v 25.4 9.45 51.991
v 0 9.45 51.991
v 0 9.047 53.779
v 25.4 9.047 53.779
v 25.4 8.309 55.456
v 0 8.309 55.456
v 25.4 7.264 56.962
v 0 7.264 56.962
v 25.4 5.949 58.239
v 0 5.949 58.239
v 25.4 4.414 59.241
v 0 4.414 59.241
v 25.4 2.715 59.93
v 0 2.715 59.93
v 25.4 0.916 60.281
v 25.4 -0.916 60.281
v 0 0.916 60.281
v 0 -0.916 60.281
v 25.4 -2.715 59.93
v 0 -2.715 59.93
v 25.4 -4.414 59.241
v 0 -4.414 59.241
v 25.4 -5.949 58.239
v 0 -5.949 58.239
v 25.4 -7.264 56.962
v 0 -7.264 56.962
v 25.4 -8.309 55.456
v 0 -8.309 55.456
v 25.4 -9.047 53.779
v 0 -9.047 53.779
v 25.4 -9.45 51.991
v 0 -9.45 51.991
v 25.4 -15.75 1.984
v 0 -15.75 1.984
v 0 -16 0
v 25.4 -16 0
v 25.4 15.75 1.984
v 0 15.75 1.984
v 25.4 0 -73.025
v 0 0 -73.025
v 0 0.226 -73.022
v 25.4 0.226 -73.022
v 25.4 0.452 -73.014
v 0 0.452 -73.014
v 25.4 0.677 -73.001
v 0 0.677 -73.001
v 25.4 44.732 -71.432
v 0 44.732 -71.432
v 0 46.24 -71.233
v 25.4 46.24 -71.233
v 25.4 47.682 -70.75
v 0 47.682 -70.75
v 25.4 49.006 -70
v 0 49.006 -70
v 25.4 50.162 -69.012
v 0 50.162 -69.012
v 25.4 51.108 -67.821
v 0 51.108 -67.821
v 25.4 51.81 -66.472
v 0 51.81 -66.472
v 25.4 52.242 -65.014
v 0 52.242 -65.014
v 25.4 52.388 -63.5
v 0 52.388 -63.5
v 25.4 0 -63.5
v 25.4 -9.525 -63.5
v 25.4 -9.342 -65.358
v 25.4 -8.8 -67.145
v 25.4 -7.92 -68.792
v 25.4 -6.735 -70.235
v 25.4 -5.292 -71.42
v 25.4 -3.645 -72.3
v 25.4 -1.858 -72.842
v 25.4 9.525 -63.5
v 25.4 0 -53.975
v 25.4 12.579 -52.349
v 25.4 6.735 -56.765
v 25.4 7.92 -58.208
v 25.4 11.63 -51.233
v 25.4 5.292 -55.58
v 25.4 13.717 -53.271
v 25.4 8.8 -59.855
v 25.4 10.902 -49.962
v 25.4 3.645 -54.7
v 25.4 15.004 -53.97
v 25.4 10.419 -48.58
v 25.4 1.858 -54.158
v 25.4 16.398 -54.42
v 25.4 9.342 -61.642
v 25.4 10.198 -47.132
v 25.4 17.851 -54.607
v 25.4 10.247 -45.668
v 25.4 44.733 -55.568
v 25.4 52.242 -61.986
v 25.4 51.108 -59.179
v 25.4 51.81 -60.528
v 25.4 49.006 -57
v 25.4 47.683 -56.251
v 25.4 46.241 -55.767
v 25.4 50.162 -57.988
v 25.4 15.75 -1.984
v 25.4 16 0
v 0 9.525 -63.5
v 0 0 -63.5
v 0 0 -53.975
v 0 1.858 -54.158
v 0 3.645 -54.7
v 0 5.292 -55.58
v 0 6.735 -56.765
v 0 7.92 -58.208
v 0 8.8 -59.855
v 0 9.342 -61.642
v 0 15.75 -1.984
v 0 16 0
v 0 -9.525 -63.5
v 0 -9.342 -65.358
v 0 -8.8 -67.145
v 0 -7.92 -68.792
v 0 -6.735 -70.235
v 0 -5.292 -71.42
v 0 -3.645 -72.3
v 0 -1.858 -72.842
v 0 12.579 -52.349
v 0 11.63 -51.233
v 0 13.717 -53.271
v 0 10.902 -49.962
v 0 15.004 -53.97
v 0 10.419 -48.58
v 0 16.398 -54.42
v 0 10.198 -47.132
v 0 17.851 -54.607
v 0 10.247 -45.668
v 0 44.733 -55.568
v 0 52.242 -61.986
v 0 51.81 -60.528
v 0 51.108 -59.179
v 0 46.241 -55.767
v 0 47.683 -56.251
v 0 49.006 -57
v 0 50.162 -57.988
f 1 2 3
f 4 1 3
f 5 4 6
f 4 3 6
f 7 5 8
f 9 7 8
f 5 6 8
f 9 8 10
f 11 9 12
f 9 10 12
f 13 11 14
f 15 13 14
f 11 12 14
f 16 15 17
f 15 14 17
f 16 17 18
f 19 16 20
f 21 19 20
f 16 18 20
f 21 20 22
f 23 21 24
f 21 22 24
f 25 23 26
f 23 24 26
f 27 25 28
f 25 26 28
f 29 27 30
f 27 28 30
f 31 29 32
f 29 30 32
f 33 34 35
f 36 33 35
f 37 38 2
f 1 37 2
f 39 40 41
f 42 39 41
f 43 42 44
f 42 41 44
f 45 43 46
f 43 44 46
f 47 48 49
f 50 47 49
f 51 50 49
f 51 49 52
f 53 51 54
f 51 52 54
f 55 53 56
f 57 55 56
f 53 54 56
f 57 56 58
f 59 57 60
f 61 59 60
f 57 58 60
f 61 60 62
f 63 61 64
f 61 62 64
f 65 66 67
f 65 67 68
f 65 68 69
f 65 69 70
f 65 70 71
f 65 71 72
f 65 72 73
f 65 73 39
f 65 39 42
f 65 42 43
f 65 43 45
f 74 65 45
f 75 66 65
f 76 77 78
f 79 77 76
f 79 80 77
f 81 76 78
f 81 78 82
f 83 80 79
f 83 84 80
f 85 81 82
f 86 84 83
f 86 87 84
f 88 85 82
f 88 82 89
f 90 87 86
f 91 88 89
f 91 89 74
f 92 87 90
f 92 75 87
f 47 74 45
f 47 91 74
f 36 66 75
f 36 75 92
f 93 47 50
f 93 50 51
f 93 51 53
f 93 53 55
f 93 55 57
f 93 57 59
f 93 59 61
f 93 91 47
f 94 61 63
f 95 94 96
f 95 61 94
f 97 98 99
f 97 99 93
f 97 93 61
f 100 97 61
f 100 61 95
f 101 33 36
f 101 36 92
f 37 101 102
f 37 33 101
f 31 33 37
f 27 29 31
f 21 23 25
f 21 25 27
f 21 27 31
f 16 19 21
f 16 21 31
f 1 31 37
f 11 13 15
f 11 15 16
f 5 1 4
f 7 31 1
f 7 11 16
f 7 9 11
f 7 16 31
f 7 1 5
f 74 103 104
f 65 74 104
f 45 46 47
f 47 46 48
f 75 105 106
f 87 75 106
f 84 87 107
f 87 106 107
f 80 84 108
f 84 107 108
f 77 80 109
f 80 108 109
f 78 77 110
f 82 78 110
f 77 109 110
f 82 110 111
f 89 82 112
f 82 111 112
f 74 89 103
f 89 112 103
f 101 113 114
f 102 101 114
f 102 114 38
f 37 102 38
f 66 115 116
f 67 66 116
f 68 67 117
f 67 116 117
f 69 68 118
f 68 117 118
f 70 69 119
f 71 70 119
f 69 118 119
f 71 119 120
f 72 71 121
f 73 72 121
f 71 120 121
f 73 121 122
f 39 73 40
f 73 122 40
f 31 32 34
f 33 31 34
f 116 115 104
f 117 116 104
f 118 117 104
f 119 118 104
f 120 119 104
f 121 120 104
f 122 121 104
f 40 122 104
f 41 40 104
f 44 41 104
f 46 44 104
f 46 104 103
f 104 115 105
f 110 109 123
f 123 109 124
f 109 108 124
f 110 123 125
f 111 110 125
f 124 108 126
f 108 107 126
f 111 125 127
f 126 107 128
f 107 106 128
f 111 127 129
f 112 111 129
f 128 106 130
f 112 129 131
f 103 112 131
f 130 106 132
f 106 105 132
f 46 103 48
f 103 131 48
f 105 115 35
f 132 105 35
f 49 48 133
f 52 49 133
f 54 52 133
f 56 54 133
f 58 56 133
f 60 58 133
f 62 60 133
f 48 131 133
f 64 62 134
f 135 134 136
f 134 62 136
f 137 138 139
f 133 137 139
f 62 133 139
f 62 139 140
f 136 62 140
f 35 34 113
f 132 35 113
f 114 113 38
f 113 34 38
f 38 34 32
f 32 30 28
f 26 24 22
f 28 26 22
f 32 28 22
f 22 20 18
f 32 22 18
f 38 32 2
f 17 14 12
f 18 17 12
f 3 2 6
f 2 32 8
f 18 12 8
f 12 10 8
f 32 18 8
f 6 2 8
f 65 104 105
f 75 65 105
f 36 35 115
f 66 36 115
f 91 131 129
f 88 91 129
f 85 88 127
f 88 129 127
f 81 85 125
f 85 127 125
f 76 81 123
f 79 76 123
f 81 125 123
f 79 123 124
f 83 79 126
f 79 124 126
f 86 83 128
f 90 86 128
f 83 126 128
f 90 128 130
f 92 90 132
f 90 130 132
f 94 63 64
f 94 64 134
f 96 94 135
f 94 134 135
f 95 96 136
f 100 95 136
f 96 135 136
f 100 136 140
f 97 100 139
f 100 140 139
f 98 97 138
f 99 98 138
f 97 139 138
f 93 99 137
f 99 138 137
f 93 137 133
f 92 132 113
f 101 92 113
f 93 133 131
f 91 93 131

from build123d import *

# Parameters (mm, degrees)
F1_DEPTH = 25.4


with BuildPart() as f1:
    # F0 (on Right) → F1 (new body)
    with BuildSketch(Plane.YZ):
        with BuildLine():
            ThreePointArc((9.525, 50.8), (6.7351920908, 44.0648079092), (0, 41.275))
            Line((0, 41.275), (0, 15.875))
            ThreePointArc((0, 15.875), (10.5003255055, 11.9062500091), (15.7504882702, 1.9843750273))
            Line((15.7504882702, 1.9843750273), (9.4502929642, 51.990625))
            ThreePointArc((9.4502929642, 51.990625), (9.5063048942, 51.396483242), (9.525, 50.8))
        make_face()
        with BuildLine():
            Line((0, 15.875), (0, 41.275))
            ThreePointArc((0, 41.275), (-7.14375, 44.4998046905), (-9.4502929642, 51.990625))
            Line((-9.4502929642, 51.990625), (-15.7504883051, 1.9843747505))
            ThreePointArc((-15.7504883051, 1.9843747505), (-10.5003256101, 11.9062499168), (0, 15.875))
        make_face()
        with BuildLine():
            ThreePointArc((-9.4502929642, 51.990625), (-7.14375, 44.4998046905), (0, 41.275))
            ThreePointArc((0, 41.275), (6.7351920908, 44.0648079092), (9.525, 50.8))
            ThreePointArc((9.525, 50.8), (9.5063048942, 51.396483242), (9.4502929642, 51.990625))
            ThreePointArc((9.4502929642, 51.990625), (0, 60.325), (-9.4502929642, 51.990625))
        make_face()
        with BuildLine():
            ThreePointArc((15.7504882702, 1.9843750273), (10.5003255055, 11.9062500091), (0, 15.875))
            Line((0, 15.875), (0, -15.875))
            ThreePointArc((0, -15.875), (10.5003255381, -11.9062499803), (15.7504882811, -1.984374941))
            ThreePointArc((15.7504882811, -1.984374941), (15.8438414922, -0.994138707), (15.875, 0))
            ThreePointArc((15.875, 0), (15.8438414895, 0.9941387503), (15.7504882702, 1.9843750273))
        make_face()
        with BuildLine():
            Line((0, -15.875), (0, 15.875))
            ThreePointArc((0, 15.875), (-10.5003256101, 11.9062499168), (-15.7504883051, 1.9843747505))
            ThreePointArc((-15.7504883051, 1.9843747505), (-11.9062499168, -10.5003256101), (0, -15.875))
        make_face()
        with BuildLine():
            ThreePointArc((15.7504882811, -1.984374941), (10.5003255381, -11.9062499803), (0, -15.875))
            Line((0, -15.875), (0, -53.975))
            ThreePointArc((0, -53.975), (6.7351920908, -56.7648079092), (9.525, -63.5))
            Line((9.525, -63.5), (36.5125, -63.5))
            ThreePointArc((36.5125, -63.5), (38.9384772185, -57.7879930953), (44.7334821429, -55.5675637964))
            Line((44.7334821429, -55.5675637964), (17.8507837718, -54.6068545332))
            ThreePointArc((17.8507837718, -54.6068545332), (12.0791026517, -51.812957818), (10.2468749586, -45.6679514317))
            Line((10.2468749586, -45.6679514317), (15.7504882811, -1.984374941))
        make_face()
        with BuildLine():
            Line((0, -53.975), (0, -15.875))
            ThreePointArc((0, -15.875), (-11.9062499168, -10.5003256101), (-15.7504883051, 1.9843747505))
            Line((-15.7504883051, 1.9843747505), (-16.0004960241, 0))
            Line((-16.0004960241, 0), (-9.525, -63.5))
            ThreePointArc((-9.525, -63.5), (-6.7351920908, -56.7648079092), (0, -53.975))
        make_face()
        with BuildLine():
            Line((16.0004960241, 0), (15.7504882702, 1.9843750273))
            ThreePointArc((15.7504882702, 1.9843750273), (15.8438414895, 0.9941387503), (15.875, 0))
            ThreePointArc((15.875, 0), (15.8438414922, -0.994138707), (15.7504882811, -1.984374941))
            Line((15.7504882811, -1.984374941), (16.0004960241, 0))
        make_face()
        with BuildLine():
            Line((0, -63.5), (0, -53.975))
            ThreePointArc((0, -53.975), (-6.7351920908, -56.7648079092), (-9.525, -63.5))
            ThreePointArc((-9.525, -63.5), (-6.7351920908, -70.2351920908), (0, -73.025))
            Line((0, -73.025), (0.6773435479, -73.000885786))
            ThreePointArc((0.6773435479, -73.000885786), (6.9705567315, -69.9912990883), (9.525, -63.5))
            Line((9.525, -63.5), (0, -63.5))
        make_face()
        with BuildLine():
            Line((36.5125, -63.5), (9.525, -63.5))
            ThreePointArc((9.525, -63.5), (6.9705567315, -69.9912990883), (0.6773435479, -73.000885786))
            Line((0.6773435479, -73.000885786), (44.7324052746, -71.4324746146))
            ThreePointArc((44.7324052746, -71.4324746146), (38.9380895153, -69.2116327839), (36.5125, -63.5))
        make_face()
        with BuildLine():
            ThreePointArc((44.7334821429, -55.5675637964), (38.9384772185, -57.7879930953), (36.5125, -63.5))
            ThreePointArc((36.5125, -63.5), (38.9380895153, -69.2116327839), (44.7324052746, -71.4324746146))
            ThreePointArc((44.7324052746, -71.4324746146), (50.1616327839, -69.0119104847), (52.3875, -63.5))
            ThreePointArc((52.3875, -63.5), (50.1620069047, -57.9884772185), (44.7334821429, -55.5675637964))
        make_face()
        with BuildLine():
            ThreePointArc((0, -73.025), (0.3388863295, -73.0189695375), (0.6773435479, -73.000885786))
            Line((0.6773435479, -73.000885786), (0, -73.025))
        make_face()
    extrude(amount=F1_DEPTH)


solid = f1.part
